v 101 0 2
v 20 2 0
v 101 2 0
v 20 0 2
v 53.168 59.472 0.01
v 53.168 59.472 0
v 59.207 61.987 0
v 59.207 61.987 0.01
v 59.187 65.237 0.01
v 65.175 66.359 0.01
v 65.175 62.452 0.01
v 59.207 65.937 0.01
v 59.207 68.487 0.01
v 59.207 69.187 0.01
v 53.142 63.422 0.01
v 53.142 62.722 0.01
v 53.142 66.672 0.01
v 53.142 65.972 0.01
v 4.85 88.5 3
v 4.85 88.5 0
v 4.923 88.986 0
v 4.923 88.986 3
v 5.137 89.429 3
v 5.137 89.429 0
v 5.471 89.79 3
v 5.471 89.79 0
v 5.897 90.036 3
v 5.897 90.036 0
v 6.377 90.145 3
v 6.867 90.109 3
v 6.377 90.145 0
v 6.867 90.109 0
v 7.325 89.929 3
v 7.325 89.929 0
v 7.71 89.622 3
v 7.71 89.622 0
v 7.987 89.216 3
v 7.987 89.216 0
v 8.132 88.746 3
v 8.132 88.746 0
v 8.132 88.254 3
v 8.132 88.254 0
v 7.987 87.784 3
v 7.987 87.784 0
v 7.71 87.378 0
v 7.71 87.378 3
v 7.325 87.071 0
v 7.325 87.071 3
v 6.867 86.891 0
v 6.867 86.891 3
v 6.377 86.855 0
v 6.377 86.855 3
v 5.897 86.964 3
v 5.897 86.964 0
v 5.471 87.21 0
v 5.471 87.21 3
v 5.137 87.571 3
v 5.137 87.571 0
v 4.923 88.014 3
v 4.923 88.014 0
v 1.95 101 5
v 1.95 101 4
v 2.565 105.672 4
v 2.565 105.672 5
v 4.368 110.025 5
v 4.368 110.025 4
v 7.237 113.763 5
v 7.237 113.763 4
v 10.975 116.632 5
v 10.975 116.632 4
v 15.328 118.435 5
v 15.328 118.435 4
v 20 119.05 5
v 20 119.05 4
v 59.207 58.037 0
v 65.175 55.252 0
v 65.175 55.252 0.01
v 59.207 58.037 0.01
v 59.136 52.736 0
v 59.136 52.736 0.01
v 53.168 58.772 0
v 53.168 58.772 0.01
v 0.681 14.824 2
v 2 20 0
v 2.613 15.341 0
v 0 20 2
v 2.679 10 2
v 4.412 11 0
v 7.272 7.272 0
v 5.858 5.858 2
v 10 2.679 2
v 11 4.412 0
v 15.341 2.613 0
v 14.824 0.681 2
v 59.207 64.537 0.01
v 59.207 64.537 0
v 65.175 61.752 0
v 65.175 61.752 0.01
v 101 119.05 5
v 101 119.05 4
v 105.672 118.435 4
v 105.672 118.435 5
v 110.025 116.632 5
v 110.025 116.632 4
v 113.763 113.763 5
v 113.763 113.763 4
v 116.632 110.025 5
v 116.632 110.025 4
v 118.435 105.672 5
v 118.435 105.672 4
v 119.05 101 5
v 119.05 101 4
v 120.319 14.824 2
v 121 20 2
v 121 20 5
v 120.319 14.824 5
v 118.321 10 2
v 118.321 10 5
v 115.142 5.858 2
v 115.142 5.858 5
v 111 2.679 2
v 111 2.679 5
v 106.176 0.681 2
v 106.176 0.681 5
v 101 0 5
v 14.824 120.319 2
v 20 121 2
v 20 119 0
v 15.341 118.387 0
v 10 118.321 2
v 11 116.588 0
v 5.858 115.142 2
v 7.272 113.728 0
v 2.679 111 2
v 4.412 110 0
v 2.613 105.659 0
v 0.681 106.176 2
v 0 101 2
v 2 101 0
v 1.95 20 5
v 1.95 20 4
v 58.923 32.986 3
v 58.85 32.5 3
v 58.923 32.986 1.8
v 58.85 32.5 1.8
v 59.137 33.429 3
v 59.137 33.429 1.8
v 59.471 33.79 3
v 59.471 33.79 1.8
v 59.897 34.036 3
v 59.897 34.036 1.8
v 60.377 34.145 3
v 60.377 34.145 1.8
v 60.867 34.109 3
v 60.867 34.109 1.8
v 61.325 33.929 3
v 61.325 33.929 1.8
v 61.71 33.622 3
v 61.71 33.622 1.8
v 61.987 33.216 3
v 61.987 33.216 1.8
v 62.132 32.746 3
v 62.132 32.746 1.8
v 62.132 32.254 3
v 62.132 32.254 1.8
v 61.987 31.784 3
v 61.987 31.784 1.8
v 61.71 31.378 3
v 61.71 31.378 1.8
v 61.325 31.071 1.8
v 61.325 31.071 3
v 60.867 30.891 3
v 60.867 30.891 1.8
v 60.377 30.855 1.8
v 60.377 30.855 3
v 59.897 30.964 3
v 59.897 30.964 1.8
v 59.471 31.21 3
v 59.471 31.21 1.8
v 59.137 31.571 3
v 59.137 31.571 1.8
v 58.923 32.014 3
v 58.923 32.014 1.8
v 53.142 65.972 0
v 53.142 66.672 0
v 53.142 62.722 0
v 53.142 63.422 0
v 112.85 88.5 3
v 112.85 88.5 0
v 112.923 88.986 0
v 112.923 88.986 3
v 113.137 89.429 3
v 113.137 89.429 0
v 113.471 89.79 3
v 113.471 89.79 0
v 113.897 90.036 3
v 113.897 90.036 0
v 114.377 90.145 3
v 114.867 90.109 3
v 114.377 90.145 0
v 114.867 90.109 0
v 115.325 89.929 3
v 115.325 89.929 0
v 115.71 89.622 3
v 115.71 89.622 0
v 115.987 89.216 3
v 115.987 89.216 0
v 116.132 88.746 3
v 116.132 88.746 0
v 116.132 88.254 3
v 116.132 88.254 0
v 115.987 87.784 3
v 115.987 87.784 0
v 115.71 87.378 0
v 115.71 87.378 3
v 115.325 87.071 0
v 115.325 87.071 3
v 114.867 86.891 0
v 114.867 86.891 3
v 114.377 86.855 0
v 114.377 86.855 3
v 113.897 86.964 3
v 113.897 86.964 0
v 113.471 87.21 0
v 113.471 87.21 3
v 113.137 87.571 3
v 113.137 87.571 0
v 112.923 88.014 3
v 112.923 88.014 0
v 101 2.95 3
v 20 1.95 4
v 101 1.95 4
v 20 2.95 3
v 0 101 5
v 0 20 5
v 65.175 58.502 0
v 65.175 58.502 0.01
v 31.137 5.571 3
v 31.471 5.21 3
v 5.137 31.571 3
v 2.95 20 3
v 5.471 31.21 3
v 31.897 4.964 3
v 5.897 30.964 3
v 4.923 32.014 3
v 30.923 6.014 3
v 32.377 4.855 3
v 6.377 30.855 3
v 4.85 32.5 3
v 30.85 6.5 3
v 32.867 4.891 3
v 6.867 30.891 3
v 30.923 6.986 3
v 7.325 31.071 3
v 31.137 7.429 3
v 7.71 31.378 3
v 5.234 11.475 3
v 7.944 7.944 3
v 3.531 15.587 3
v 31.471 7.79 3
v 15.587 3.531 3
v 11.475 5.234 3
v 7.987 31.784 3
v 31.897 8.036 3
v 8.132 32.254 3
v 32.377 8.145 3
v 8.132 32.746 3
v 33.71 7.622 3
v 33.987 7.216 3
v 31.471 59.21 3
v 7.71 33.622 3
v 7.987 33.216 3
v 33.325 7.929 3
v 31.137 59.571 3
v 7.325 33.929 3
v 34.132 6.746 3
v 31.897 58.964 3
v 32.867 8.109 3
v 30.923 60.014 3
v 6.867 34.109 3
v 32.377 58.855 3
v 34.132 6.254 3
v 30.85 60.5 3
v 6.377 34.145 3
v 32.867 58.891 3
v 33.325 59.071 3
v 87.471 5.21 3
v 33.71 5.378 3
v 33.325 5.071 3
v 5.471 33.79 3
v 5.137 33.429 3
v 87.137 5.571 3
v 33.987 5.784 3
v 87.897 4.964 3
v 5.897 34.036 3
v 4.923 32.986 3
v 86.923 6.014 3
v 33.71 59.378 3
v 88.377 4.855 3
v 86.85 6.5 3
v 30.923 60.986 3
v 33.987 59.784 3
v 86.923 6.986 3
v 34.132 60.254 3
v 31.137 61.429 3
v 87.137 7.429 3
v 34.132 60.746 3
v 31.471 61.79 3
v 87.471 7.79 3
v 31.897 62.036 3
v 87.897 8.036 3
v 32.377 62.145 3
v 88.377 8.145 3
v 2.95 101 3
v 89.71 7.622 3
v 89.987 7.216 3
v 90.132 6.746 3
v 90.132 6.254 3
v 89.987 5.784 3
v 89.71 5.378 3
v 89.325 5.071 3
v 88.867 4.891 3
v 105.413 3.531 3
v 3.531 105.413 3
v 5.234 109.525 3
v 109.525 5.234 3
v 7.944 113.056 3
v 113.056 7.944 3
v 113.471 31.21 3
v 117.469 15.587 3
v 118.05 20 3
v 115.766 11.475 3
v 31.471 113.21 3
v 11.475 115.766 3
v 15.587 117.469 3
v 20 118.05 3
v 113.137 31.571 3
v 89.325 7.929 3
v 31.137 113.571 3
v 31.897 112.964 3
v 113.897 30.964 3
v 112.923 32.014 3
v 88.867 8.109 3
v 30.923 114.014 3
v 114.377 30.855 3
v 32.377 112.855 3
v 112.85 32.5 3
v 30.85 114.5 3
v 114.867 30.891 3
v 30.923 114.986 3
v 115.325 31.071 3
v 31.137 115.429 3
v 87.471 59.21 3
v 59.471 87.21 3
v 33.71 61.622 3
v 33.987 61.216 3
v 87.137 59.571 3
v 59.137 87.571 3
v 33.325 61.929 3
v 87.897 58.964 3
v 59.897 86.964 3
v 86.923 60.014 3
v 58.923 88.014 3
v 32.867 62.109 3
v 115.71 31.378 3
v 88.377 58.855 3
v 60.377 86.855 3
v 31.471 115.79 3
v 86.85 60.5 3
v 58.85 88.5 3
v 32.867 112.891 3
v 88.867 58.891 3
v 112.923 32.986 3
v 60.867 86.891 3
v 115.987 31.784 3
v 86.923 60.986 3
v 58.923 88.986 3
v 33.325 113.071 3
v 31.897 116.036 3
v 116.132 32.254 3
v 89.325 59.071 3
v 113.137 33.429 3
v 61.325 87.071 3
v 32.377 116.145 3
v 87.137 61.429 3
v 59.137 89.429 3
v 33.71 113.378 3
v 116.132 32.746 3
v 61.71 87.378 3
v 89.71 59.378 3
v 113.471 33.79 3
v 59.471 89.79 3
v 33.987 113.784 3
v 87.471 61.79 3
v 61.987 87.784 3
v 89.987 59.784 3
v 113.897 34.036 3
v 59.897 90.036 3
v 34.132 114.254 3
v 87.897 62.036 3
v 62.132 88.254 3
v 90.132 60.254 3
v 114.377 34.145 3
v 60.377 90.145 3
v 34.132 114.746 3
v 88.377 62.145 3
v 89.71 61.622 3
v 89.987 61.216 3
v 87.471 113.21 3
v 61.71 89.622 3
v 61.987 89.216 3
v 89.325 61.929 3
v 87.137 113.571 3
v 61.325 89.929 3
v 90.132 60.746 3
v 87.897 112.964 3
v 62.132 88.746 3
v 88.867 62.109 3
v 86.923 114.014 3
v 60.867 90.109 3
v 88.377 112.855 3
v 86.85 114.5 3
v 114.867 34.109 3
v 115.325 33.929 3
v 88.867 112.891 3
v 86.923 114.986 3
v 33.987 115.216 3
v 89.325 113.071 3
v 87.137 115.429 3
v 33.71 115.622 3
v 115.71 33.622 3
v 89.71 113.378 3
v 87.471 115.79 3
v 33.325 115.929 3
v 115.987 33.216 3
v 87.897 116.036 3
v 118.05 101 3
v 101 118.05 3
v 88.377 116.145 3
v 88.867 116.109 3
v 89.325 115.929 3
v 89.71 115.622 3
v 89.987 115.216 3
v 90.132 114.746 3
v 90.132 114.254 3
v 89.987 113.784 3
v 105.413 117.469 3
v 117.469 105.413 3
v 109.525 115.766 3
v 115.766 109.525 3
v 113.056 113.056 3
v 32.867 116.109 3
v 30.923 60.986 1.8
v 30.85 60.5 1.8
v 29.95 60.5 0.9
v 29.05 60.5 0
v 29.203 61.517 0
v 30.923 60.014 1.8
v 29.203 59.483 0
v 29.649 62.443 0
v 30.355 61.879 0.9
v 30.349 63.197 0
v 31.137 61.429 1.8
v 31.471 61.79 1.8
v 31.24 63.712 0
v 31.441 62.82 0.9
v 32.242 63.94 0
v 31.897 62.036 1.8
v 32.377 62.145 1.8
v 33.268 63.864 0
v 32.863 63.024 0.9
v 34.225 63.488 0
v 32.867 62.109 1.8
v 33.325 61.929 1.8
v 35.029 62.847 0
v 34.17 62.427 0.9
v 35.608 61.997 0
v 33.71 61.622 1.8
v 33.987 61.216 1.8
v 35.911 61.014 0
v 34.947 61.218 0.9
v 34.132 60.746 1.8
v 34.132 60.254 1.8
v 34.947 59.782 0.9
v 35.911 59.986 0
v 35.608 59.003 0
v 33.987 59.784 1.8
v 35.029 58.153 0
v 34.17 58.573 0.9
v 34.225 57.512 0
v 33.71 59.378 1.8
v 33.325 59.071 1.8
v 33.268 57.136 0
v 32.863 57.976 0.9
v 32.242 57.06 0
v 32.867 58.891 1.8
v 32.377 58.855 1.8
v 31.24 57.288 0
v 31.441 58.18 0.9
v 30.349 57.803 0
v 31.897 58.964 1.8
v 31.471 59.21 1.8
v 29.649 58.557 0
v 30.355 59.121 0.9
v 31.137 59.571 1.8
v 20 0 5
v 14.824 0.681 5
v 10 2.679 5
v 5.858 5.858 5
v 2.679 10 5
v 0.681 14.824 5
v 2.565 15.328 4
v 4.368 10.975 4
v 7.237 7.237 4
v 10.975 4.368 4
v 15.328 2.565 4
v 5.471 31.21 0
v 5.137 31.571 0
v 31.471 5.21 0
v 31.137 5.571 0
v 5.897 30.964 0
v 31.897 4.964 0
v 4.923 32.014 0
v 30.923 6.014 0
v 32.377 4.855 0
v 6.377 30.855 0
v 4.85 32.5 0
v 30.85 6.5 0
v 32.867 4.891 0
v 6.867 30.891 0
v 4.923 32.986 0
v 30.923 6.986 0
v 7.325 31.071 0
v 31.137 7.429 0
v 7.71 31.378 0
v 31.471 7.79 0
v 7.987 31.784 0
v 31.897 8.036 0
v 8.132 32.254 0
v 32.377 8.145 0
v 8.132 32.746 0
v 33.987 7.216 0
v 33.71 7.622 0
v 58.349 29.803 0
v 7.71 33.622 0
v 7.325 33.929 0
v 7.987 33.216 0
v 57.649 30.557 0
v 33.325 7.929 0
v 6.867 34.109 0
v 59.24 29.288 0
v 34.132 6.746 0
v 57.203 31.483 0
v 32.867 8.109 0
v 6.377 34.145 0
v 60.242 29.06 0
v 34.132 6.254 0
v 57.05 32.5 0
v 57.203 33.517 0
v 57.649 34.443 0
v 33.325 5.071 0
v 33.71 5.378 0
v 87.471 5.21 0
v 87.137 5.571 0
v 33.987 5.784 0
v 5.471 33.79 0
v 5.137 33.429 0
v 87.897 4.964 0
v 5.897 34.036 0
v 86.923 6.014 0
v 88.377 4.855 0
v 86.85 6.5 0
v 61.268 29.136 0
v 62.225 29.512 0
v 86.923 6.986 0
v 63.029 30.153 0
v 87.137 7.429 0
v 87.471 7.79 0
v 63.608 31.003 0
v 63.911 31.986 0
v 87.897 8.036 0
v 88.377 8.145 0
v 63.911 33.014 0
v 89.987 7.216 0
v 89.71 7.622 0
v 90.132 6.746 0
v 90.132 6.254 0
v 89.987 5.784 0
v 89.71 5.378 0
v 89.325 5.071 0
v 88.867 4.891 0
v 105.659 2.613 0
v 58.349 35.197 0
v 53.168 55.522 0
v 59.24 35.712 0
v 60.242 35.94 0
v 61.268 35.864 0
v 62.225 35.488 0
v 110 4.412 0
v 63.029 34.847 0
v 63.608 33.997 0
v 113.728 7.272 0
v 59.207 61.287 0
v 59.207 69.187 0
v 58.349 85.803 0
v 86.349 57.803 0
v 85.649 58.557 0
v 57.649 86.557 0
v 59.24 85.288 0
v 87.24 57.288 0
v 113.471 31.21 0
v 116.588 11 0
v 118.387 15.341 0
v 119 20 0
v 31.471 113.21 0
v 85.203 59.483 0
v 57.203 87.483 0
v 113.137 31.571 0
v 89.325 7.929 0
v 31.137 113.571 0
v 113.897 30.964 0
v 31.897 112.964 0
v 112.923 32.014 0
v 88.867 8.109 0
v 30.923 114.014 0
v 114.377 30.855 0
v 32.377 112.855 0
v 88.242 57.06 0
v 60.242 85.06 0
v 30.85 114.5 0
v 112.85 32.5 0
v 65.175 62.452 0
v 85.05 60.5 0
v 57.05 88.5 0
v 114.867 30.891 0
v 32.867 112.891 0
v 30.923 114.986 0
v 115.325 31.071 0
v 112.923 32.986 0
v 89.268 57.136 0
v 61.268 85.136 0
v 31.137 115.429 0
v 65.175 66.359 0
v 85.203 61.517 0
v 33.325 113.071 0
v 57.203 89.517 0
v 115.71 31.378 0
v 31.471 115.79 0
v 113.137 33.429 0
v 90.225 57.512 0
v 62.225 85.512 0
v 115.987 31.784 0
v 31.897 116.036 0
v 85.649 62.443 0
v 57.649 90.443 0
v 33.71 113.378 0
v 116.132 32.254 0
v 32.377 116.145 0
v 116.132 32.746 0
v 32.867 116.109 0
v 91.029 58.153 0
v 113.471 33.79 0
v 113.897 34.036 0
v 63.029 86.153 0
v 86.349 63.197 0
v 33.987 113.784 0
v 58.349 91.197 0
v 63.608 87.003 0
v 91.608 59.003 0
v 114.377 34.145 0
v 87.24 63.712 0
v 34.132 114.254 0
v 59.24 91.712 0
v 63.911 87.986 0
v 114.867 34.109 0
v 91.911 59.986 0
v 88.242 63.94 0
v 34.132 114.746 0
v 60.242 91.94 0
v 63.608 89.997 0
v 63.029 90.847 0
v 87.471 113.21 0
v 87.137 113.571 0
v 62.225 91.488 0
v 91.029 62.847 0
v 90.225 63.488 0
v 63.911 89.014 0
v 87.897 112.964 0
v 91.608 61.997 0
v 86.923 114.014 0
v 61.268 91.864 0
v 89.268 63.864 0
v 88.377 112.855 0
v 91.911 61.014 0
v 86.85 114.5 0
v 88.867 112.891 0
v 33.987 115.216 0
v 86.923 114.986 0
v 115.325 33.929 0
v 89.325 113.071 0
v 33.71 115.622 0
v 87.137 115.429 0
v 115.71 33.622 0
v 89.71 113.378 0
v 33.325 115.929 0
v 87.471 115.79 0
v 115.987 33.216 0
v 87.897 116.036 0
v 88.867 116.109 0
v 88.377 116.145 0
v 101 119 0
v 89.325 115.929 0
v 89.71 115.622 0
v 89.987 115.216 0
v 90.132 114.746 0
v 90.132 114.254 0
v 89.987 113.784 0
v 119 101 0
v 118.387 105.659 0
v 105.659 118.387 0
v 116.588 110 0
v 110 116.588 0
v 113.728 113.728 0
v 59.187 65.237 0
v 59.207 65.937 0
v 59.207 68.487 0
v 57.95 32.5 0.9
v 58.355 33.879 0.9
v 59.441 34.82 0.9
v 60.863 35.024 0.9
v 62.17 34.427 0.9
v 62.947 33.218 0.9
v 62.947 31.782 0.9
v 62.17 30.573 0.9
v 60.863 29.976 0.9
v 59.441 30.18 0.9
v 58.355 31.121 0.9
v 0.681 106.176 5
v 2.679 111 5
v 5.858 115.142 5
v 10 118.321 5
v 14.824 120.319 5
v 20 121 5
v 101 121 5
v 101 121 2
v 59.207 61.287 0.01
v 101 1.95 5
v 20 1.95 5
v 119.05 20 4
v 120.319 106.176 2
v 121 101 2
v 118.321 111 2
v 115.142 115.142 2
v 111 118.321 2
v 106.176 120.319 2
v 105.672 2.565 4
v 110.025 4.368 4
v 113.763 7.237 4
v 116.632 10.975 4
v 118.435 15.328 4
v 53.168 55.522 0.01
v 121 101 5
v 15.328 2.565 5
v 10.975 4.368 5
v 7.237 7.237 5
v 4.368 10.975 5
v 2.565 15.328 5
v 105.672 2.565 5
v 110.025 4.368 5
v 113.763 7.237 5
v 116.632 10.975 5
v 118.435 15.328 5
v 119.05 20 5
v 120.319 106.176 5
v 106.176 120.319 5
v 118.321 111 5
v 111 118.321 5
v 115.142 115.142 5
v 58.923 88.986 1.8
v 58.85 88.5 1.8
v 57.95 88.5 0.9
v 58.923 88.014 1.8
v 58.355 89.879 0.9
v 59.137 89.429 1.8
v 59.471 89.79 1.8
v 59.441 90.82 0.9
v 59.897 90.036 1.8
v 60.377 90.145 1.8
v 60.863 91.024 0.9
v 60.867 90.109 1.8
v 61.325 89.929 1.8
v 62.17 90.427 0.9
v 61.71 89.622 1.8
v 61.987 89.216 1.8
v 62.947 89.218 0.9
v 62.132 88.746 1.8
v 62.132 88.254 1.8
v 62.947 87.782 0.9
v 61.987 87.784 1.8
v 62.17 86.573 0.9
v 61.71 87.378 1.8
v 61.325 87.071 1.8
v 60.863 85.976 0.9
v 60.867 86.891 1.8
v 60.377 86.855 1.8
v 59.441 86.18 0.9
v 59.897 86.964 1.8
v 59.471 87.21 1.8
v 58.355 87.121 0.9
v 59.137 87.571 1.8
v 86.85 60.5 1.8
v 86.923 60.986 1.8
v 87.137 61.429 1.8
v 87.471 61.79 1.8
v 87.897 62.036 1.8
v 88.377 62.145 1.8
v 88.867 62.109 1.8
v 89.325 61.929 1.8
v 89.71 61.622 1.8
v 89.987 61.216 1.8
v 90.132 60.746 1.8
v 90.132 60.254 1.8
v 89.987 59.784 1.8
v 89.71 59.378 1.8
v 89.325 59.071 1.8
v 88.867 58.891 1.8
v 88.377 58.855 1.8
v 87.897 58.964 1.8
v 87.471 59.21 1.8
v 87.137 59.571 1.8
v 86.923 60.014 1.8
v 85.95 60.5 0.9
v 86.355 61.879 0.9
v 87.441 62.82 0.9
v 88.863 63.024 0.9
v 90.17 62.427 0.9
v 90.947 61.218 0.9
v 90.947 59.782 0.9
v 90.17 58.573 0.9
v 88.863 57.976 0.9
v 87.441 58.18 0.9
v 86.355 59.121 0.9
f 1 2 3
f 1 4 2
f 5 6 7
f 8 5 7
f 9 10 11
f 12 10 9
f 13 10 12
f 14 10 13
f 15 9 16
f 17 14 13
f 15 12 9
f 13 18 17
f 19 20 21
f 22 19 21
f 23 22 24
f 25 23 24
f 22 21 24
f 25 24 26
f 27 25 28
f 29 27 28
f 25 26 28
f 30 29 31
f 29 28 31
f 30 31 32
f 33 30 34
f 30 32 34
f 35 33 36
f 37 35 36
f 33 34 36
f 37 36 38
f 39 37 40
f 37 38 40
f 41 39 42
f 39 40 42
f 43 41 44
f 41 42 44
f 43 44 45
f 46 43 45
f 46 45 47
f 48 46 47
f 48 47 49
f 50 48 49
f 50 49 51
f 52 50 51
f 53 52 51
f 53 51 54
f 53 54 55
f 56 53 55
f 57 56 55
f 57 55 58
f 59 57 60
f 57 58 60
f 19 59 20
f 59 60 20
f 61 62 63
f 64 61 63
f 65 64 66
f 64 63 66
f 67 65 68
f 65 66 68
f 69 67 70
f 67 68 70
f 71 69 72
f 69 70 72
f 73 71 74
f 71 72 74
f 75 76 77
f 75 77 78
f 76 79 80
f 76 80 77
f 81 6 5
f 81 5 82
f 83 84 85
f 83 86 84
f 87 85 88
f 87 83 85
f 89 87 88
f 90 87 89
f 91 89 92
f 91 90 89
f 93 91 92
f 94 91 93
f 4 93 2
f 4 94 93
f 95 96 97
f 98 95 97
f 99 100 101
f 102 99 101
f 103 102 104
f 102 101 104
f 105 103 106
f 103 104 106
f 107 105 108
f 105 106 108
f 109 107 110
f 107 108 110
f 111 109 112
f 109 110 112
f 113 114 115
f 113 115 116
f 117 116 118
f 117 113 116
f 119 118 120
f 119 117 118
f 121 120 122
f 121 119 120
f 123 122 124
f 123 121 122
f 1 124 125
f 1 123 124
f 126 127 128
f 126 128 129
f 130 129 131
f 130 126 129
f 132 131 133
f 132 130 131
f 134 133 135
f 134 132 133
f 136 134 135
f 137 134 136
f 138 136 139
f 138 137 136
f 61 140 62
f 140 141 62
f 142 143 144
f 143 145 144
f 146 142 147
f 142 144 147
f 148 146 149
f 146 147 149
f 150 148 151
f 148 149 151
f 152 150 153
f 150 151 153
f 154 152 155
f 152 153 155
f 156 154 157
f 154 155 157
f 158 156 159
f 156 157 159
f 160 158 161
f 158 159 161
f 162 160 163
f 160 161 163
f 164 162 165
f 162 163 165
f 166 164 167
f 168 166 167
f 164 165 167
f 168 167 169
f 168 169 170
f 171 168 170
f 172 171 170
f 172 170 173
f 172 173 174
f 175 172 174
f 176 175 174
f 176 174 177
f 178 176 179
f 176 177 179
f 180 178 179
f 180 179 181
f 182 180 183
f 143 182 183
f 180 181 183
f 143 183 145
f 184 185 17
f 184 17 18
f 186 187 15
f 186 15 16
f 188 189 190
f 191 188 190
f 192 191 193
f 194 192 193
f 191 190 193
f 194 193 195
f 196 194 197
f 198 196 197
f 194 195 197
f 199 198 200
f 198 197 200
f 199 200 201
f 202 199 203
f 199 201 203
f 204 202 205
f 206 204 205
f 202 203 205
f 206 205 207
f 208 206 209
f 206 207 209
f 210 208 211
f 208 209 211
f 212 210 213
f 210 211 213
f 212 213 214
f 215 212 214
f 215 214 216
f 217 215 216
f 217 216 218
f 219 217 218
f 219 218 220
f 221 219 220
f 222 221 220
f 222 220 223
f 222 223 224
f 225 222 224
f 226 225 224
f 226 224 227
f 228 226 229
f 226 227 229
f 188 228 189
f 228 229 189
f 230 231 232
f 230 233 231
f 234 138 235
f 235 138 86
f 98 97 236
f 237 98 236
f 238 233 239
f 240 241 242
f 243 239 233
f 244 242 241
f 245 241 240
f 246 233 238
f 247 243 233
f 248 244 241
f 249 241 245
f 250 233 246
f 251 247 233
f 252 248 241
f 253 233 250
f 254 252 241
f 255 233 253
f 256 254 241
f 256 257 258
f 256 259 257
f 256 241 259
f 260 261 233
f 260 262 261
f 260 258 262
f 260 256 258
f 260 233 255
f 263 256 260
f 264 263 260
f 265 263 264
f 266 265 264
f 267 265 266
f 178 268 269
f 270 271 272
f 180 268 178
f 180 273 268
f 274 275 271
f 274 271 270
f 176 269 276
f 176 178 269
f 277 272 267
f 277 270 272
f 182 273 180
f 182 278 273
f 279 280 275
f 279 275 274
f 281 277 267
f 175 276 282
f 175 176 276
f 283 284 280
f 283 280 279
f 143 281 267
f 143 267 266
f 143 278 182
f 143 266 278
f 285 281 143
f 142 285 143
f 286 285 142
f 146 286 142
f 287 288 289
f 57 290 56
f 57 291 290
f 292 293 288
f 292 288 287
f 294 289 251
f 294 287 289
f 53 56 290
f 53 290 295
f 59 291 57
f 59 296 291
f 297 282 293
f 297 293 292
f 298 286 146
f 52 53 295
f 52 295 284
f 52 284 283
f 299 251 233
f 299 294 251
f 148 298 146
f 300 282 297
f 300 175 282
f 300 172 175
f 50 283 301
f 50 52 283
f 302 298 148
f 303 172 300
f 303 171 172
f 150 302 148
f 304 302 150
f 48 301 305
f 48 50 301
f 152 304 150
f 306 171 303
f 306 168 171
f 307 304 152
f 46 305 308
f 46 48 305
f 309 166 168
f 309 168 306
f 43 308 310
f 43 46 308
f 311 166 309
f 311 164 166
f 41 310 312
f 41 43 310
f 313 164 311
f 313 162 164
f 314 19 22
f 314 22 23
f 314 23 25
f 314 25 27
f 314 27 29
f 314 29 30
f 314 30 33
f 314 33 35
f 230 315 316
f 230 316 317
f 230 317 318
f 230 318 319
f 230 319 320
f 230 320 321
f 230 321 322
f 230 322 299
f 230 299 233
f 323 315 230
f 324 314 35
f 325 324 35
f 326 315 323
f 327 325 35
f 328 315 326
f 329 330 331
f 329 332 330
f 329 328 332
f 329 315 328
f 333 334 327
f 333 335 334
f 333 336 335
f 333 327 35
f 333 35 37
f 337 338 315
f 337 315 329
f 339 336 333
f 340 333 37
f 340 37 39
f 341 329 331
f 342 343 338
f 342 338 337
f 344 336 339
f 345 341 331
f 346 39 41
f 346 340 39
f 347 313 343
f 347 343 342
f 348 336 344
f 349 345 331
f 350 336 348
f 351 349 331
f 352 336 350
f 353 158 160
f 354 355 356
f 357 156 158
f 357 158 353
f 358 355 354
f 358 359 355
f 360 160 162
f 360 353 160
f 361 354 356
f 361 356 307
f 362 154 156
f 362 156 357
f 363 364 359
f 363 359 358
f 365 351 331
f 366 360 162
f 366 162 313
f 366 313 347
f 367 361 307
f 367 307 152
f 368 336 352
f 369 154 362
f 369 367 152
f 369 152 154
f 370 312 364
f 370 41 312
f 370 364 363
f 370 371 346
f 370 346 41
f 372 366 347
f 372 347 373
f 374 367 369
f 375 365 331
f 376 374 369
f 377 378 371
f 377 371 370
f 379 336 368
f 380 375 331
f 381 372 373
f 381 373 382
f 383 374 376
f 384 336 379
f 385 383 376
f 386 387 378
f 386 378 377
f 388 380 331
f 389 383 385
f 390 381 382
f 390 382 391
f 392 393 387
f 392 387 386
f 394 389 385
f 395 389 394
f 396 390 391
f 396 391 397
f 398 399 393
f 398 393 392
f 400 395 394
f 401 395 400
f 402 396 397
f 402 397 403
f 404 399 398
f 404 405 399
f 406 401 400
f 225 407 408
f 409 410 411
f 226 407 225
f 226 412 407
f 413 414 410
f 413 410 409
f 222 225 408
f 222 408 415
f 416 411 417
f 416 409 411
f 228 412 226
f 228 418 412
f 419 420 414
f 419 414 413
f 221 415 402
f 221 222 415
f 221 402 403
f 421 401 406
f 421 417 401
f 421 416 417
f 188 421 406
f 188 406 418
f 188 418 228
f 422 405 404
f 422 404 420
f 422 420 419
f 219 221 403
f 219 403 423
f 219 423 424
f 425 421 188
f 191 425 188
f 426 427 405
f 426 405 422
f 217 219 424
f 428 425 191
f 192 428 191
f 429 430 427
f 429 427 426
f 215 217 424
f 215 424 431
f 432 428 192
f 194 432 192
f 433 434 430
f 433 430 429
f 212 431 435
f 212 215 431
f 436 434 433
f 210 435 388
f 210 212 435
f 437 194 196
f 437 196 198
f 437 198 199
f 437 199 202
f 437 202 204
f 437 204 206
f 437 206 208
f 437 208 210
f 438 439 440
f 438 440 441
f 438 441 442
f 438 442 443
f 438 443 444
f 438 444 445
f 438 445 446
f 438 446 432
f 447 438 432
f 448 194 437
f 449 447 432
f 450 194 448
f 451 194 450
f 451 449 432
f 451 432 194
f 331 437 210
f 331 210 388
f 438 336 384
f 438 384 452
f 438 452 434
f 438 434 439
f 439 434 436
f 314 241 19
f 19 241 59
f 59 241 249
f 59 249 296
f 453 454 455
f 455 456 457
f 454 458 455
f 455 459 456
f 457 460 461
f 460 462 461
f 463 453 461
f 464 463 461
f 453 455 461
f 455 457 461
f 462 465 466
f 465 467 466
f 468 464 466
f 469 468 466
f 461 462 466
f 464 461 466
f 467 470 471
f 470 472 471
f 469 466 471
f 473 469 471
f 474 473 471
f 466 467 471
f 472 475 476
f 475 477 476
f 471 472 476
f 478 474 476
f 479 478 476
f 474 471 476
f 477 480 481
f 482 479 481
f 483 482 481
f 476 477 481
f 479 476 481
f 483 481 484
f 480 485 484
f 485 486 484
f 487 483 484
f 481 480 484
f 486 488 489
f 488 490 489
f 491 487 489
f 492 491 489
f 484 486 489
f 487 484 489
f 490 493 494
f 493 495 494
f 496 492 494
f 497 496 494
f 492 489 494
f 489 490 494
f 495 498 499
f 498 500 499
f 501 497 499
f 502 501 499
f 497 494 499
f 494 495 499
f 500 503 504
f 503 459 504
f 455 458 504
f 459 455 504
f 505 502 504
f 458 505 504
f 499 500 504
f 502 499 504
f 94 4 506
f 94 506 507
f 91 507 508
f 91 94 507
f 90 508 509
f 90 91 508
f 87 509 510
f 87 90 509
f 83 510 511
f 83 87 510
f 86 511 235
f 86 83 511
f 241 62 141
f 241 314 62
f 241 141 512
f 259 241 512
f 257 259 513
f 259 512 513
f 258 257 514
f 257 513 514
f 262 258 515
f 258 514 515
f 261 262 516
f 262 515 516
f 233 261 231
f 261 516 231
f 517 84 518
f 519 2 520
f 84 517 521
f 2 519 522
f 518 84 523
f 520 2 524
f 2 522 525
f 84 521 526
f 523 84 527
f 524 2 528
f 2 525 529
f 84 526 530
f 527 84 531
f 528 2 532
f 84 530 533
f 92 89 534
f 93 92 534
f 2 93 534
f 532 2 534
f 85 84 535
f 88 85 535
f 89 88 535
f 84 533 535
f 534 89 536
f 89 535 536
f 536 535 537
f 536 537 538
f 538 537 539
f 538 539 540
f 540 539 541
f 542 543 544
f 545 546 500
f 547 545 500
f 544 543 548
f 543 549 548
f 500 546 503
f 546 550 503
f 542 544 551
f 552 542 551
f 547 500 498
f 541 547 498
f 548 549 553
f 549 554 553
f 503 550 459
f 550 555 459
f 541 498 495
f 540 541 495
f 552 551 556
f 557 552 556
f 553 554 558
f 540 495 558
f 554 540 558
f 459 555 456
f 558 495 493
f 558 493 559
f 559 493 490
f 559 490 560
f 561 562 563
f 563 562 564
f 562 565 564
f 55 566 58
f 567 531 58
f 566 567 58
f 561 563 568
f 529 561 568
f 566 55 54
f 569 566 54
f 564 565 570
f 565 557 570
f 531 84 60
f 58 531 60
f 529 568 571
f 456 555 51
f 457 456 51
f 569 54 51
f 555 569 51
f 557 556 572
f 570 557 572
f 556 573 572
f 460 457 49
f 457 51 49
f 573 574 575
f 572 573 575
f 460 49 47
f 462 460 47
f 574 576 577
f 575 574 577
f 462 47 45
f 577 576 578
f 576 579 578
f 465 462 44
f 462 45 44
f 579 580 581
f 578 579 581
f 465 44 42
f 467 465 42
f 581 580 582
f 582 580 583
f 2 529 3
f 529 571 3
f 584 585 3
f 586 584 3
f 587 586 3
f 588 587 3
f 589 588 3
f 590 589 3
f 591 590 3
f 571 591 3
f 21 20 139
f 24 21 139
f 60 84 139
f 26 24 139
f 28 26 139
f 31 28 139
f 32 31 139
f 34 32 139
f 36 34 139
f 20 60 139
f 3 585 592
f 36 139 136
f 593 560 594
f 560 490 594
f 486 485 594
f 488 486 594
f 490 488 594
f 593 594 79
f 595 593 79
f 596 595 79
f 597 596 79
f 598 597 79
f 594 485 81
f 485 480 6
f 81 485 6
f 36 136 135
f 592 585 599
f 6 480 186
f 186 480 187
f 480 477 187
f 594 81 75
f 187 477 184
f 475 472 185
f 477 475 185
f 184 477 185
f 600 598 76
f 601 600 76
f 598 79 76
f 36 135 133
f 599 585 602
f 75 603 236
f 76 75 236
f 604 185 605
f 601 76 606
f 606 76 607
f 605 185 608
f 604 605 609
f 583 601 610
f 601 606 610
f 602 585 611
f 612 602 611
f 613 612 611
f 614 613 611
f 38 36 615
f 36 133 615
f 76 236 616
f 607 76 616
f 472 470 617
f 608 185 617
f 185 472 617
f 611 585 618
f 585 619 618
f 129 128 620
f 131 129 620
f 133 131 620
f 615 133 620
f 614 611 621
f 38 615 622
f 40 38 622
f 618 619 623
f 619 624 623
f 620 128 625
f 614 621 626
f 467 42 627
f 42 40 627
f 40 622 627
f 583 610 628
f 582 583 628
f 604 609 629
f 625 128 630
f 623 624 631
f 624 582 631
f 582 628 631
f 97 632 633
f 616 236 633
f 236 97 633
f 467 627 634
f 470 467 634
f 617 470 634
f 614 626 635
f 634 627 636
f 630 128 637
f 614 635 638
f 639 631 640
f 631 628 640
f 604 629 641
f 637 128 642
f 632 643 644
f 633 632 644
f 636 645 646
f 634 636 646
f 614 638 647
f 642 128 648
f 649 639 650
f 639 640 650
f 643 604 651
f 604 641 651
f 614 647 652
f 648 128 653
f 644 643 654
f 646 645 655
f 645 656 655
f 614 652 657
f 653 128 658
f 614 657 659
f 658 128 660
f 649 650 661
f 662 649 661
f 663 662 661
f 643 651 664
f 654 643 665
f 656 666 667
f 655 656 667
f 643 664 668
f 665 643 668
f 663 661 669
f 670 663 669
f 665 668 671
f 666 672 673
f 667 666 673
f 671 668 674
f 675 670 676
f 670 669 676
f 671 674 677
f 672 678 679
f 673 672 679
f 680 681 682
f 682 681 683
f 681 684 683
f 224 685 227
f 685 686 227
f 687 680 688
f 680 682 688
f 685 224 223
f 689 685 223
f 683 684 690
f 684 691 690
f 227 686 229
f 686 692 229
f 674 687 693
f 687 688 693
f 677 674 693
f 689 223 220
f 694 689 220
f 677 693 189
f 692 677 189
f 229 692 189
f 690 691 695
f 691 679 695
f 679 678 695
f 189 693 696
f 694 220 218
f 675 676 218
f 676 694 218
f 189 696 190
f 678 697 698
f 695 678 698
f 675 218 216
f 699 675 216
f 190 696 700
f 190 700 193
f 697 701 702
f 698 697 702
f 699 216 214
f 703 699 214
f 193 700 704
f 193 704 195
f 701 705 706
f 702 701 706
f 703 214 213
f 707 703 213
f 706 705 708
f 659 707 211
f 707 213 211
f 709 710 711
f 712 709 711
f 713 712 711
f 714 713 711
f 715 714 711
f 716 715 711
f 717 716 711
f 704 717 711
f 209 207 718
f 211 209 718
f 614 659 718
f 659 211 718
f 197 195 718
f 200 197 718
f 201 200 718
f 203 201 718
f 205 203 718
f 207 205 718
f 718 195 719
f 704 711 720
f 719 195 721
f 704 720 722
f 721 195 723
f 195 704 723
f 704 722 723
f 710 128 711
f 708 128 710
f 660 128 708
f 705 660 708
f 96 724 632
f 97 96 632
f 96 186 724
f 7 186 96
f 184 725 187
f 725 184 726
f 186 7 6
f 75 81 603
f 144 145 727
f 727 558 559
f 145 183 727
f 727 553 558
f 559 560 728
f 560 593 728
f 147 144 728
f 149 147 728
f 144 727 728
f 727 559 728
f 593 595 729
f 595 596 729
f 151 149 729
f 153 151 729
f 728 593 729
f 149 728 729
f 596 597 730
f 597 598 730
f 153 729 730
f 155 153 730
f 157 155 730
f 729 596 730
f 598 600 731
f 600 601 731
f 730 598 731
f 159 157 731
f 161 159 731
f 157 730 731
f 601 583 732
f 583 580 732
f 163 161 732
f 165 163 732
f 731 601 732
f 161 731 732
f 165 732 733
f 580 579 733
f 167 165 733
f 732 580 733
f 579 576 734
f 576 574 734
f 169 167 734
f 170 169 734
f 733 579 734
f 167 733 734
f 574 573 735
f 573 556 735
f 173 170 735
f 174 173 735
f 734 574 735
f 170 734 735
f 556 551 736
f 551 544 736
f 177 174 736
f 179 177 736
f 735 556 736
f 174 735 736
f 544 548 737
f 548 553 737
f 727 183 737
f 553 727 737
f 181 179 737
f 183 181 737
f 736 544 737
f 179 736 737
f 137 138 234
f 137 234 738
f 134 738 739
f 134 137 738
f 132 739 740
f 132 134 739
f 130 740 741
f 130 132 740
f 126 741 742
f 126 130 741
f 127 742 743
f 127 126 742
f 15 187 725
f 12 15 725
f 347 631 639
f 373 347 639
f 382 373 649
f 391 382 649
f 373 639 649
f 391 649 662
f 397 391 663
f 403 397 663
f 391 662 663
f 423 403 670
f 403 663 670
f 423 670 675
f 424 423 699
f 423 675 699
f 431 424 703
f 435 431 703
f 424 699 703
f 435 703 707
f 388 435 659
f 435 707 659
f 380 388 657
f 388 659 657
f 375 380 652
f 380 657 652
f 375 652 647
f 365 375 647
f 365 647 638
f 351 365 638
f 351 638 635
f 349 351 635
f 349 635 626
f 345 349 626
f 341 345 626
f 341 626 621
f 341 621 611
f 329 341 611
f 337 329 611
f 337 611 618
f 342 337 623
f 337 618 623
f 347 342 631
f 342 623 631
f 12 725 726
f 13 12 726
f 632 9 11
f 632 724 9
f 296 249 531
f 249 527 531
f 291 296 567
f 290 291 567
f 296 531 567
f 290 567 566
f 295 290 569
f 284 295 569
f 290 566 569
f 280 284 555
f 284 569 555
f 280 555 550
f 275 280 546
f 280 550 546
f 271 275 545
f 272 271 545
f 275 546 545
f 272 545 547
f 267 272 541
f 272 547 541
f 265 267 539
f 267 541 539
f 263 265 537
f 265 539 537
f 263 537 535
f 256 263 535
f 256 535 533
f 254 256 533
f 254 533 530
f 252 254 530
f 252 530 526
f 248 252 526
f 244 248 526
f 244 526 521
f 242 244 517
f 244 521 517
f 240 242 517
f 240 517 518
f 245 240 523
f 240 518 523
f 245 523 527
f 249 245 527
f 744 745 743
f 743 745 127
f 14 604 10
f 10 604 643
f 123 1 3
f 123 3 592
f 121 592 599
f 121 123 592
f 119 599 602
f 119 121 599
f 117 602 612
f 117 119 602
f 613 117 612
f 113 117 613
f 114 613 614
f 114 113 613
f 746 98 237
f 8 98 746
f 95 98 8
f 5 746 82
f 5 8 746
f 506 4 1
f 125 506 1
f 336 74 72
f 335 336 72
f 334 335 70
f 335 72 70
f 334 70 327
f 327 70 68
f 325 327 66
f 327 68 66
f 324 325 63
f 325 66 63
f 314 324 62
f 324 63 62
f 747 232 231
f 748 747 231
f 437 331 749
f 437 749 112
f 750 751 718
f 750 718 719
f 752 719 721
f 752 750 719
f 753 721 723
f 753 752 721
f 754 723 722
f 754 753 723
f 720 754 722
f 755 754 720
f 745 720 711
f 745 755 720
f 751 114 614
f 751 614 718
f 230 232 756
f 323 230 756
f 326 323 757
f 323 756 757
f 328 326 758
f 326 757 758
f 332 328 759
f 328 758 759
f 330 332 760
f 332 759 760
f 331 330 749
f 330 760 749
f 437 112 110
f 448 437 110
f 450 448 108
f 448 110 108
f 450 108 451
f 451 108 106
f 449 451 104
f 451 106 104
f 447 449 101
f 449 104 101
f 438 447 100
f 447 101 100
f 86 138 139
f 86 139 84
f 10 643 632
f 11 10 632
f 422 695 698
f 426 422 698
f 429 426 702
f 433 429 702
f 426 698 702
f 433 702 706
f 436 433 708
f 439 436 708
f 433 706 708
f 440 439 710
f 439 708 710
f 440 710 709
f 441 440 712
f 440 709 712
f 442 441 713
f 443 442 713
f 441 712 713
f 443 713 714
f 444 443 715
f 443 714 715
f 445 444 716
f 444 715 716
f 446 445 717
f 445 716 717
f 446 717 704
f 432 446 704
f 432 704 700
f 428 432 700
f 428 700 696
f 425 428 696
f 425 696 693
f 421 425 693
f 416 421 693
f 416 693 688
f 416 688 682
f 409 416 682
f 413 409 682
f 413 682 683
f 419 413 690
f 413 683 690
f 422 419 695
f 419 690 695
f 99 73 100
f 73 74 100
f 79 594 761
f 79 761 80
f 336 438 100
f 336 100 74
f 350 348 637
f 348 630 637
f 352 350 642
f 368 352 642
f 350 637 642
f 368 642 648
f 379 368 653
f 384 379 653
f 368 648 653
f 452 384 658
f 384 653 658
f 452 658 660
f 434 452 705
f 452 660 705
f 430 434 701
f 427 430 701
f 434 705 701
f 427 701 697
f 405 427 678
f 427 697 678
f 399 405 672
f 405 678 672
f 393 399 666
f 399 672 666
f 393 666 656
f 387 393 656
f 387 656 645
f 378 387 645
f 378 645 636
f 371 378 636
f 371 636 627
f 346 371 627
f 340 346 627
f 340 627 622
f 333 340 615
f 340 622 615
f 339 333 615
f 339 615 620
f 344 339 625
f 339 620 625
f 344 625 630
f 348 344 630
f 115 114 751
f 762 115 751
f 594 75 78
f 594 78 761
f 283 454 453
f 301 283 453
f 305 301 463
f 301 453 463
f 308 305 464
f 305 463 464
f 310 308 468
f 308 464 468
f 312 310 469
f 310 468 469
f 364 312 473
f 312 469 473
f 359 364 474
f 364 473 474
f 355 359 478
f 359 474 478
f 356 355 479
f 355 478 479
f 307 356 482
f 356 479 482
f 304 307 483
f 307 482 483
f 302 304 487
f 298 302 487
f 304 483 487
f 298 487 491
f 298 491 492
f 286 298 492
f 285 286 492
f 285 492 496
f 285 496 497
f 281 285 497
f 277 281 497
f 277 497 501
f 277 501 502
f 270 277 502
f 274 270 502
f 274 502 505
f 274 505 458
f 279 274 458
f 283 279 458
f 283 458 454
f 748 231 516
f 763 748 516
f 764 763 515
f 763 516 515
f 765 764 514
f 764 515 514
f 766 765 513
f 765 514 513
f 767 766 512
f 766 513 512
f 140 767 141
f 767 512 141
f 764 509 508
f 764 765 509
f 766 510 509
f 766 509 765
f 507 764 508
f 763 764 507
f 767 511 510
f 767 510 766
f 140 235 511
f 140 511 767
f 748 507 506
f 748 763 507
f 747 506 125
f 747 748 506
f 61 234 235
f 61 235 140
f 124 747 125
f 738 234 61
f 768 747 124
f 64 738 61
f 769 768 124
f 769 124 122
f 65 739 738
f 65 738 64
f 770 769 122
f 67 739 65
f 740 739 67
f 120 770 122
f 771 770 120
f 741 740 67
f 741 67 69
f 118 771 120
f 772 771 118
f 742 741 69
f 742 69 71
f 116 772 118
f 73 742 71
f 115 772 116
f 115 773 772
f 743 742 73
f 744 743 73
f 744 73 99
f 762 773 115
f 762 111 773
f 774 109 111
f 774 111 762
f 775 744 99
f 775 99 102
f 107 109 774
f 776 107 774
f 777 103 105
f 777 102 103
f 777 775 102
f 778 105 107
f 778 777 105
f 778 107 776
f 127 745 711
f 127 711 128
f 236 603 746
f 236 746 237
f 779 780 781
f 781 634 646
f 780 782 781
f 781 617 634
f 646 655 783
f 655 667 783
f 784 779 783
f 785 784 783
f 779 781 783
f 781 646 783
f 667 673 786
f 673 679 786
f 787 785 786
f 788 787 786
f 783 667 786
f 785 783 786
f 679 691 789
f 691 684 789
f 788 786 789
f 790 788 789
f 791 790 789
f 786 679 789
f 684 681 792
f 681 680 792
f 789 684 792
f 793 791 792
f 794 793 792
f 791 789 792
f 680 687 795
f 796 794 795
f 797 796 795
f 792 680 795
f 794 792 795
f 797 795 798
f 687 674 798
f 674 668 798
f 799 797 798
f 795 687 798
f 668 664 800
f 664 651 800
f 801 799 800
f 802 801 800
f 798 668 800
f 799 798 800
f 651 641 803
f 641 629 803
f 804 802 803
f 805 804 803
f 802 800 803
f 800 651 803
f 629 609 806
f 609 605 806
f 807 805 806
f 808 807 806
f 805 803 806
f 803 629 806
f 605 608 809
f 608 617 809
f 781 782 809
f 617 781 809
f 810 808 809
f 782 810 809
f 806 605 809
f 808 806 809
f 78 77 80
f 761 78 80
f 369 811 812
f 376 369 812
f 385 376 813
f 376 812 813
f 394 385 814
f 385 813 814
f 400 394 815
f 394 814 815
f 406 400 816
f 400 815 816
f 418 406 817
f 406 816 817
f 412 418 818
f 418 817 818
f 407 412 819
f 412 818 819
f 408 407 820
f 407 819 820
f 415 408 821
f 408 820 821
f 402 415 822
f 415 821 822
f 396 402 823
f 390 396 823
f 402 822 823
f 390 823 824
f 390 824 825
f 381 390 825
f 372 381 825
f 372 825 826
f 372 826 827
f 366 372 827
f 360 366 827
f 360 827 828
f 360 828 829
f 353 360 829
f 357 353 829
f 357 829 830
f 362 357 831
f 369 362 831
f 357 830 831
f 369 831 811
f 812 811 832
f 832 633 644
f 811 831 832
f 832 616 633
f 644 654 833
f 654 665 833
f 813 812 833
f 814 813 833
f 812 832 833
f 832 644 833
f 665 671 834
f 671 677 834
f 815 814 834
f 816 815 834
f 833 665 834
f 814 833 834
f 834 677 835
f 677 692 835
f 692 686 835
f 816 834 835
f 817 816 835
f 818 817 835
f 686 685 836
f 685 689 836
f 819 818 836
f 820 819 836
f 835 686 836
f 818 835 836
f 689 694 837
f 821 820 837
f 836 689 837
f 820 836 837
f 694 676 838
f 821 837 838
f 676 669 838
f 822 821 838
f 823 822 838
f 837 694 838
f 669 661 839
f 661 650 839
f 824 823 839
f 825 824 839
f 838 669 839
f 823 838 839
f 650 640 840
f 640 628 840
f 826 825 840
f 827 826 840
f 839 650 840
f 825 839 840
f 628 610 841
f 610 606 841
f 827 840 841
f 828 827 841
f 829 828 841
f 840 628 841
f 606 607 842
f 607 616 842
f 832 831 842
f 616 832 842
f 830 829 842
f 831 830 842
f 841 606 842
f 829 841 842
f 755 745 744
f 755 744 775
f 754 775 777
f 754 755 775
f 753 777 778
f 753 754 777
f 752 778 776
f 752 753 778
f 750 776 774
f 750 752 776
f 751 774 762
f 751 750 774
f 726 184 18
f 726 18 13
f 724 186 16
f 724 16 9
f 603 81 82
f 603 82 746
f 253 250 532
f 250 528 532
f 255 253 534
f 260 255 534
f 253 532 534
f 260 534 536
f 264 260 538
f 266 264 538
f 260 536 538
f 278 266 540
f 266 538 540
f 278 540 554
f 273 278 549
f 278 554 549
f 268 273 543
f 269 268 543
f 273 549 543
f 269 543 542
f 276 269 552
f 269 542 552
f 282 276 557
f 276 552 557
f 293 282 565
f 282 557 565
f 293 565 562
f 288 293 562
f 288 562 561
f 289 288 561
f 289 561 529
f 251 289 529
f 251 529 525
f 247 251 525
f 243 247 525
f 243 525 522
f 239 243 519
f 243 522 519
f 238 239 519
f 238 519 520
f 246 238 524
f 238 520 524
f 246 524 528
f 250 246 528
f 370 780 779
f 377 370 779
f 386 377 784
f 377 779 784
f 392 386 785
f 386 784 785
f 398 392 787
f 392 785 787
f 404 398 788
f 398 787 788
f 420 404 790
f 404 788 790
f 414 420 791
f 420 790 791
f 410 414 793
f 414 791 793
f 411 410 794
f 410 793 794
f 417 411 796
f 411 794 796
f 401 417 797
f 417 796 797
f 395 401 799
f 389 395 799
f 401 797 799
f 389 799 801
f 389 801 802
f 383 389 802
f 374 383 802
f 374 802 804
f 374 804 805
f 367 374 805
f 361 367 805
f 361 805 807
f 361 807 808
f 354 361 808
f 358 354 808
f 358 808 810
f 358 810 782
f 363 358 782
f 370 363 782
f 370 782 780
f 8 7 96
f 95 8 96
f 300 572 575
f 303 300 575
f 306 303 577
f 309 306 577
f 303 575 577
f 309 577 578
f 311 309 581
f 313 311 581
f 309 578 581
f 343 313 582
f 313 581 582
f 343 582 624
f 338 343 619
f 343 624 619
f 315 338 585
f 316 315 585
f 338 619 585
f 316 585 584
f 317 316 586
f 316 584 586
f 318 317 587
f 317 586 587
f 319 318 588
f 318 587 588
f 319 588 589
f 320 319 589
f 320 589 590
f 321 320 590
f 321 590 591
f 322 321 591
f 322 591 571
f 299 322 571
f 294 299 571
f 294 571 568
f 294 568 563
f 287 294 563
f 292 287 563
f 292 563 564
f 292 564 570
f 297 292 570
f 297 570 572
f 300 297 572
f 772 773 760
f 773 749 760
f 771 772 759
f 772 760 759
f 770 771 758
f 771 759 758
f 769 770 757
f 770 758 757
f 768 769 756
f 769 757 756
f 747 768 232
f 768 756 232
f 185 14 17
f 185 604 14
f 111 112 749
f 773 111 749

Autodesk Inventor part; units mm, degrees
ref_plane "YZ Plane" through (0, 0, 0) normal (1, 0, 0) x (0, 1, 0)
ref_plane "XZ Plane" through (0, 0, 0) normal (0, 1, 0) x (-1, 0, 0)
ref_plane "XY Plane" through (0, 0, 0) normal (0, 0, 1) x (1, 0, 0)
sketch "Sketch1" plane through (0, 0, 0) normal (0, 0, 1) x (1, 0, 0)
  line L0 (20, 0) -> (101, 0)
  line L1 (121, 20) -> (121, 101)
  line L2 (101, 121) -> (20, 121)
  line L3 (0, 101) -> (0, 20)
  arc A0 (20, 121) -> (0, 101) centre (20, 101) ccw
  arc A1 (121, 101) -> (101, 121) centre (101, 101) ccw
  arc A2 (101, 0) -> (121, 20) centre (101, 20) ccw
  arc A3 (0, 20) -> (20, 0) centre (20, 20) ccw
  point P0 (0, 0)
  point P1 (121, 121)
  point P2 (121, 0)
  point P3 (0, 121)
  dimension "d0" = 121
  dimension "d1" = 121
  dimension "d2" = 20
extrude "Extrusion1" add sketch "Sketch1" along normal blind 3
sketch "Sketch2" plane through (0, 0, 3) normal (0, 0, 1) x (1, 0, 0)
  arc A0 (101, 0) -> (121, 20) centre (101, 20) ccw projected
  line L0 (121, 20) -> (121, 101) projected
  arc A1 (121, 101) -> (101, 121) centre (101, 101) ccw projected
  line L1 (101, 121) -> (20, 121) projected
  arc A2 (20, 121) -> (0, 101) centre (20, 101) ccw projected
  line L2 (0, 101) -> (0, 20) projected
  arc A3 (0, 20) -> (20, 0) centre (20, 20) ccw projected
  line L3 (20, 0) -> (101, 0) projected
  line L4 (20, 119.05) -> (101, 119.05)
  arc A4 (119.05, 101) -> (101, 119.05) centre (101, 101) ccw
  line L5 (119.05, 101) -> (119.05, 20)
  arc A5 (101, 1.95) -> (119.05, 20) centre (101, 20) ccw
  line L6 (101, 1.95) -> (20, 1.95)
  arc A6 (1.95, 20) -> (20, 1.95) centre (20, 20) ccw
  line L7 (1.95, 20) -> (1.95, 101)
  arc A7 (20, 119.05) -> (1.95, 101) centre (20, 101) ccw
  point P0 (0, 0)
  dimension "d5" = 1.95
extrude "Extrusion2" add sketch "Sketch2" along normal blind 2
chamfer "Chamfer1" distance 1 angle 45 8 edges at (1.95, 60.5, 3) (7.2367, 7.2367, 3) (60.5, 1.95, 3) (113.7633, 7.2367, 3) (119.05, 60.5, 3) (113.7633, 113.7633, 3) (60.5, 119.05, 3) (7.2367, 113.7633, 3)
sketch "Sketch3" plane through (0, 0, 0) normal (0, 0, -1) x (-1, 0, 0)
  circle A0 centre (-6.5, 88.5) radius 2.15 projected
  circle A1 centre (-6.5, 32.5) radius 2.15 projected
  circle A2 centre (-32.5, 6.5) radius 2.15 projected
  circle A3 centre (-88.5, 6.5) radius 2.15 projected
  circle A4 centre (-114.5, 32.5) radius 2.15 projected
  circle A5 centre (-114.5, 88.5) radius 2.15 projected
  circle A6 centre (-88.5, 114.5) radius 2.15 projected
  circle A7 centre (-32.5, 114.5) radius 2.15 projected
  circle A8 centre (-60.5, 60.5) radius 2.15 projected
  circle A9 centre (-60.5, 88.5) radius 2.15 projected
  circle A10 centre (-88.5, 60.5) radius 2.15 projected
  circle A11 centre (-60.5, 32.5) radius 2.15 projected
  circle A12 centre (-32.5, 60.5) radius 2.15 projected
  circle A13 centre (-88.5, 114.5) radius 1.65
  circle A14 centre (-32.5, 114.5) radius 1.65
  circle A15 centre (-60.5, 88.5) radius 1.65
  circle A16 centre (-114.5, 88.5) radius 1.65
  circle A17 centre (-88.5, 60.5) radius 1.65
  circle A18 centre (-60.5, 60.5) radius 1.65
  circle A19 centre (-32.5, 60.5) radius 1.65
  circle A20 centre (-6.5, 88.5) radius 1.65
  circle A21 centre (-6.5, 32.5) radius 1.65
  circle A22 centre (-60.5, 32.5) radius 1.65
  circle A23 centre (-114.5, 32.5) radius 1.65
  circle A24 centre (-88.5, 6.5) radius 1.65
  circle A25 centre (-32.5, 6.5) radius 1.65
  point P0 (0, 0)
  dimension "d11" = 3.3
  dimension "d12" = 3.3
  dimension "d13" = 3.3
  dimension "d14" = 3.3
  dimension "d15" = 3.3
  dimension "d16" = 3.3
  dimension "d17" = 3.3
  dimension "d18" = 3.3
  dimension "d19" = 3.3
  dimension "d20" = 3.3
  dimension "d21" = 3.3
  dimension "d22" = 3.3
  dimension "d23" = 3.3
extrude "Extrusion3" cut sketch "Sketch3" against normal through all contours A13 | A14 | A15 | A16 | A17 | A19 | A20 | A21 | A22 | A23 | A24 | A25
chamfer "Chamfer2" distance 1.8 angle 45 4 edges at (62.15, 88.5, 0) (90.15, 60.5, 0) (34.15, 60.5, 0) (62.15, 32.5, 0)
chamfer "Chamfer3" distance 2 angle 45 8 edges at (60.5, 121, 0) (5.8579, 115.1421, 0) (0, 60.5, 0) (5.8579, 5.8579, 0) (60.5, 0, 0) (115.1421, 5.8579, 0) (121, 60.5, 0) (115.1421, 115.1421, 0)
sketch "Sketch4" plane through (0, 0, 0) normal (0, 0, -1) x (-1, 0, 0)
  line L0 (-53.168, 55.5218) -> (-59.1357, 52.7365)
  line L1 (-59.1357, 52.7365) -> (-65.1751, 55.2519)
  line L2 (-65.1751, 55.2519) -> (-59.2074, 58.0372)
  line L3 (-59.2074, 58.0372) -> (-53.168, 55.5218)
  line L4 (-53.168, 59.4718) -> (-59.2074, 61.9872)
  line L5 (-59.2074, 61.9872) -> (-59.2074, 64.5372)
  line L6 (-59.2074, 64.5372) -> (-65.1751, 61.7519)
  line L7 (-65.1751, 61.7519) -> (-65.1751, 58.5019)
  line L8 (-53.168, 59.4718) -> (-53.168, 58.7718)
  line L9 (-53.168, 58.7718) -> (-59.2074, 61.2872)
  line L10 (-59.2074, 61.2872) -> (-65.1751, 58.5019)
  line L11 (-59.2074, 69.1872) -> (-65.1751, 66.359)
  line L12 (-59.2074, 65.9372) -> (-59.2074, 68.4872)
  line L13 (-53.1419, 63.4218) -> (-59.2074, 65.9372)
  line L14 (-53.1419, 63.4218) -> (-53.1419, 62.7218)
  line L15 (-53.1419, 62.7218) -> (-59.1873, 65.2372)
  line L16 (-65.1751, 66.359) -> (-65.1751, 62.4519)
  line L17 (-59.1873, 65.2372) -> (-65.1751, 62.4519)
  line L18 (-59.2074, 69.1872) -> (-53.1419, 66.6718)
  line L19 (-53.1419, 66.6718) -> (-53.1419, 65.9718)
  line L20 (-53.1419, 65.9718) -> (-59.2074, 68.4872)
  point P0 (0, 0)
  dimension "d32" = 0.7
  dimension "d33" = 0.7
  dimension "d34" = 0.7
  dimension "d35" = 0.7
  dimension "d36" = 0
  dimension "d37" = 3.25
  dimension "d38" = 0.7
  dimension "d39" = 0.7
  dimension "d40" = 0.7
  dimension "d41" = 0.7
  dimension "d42" = 3.25
  dimension "d43" = 3.25
  dimension "d44" = 3.25
  dimension "d45" = 3.25
  dimension "d46" = 3.25
  dimension "d47" = 3.25
extrude "Extrusion4" cut sketch "Sketch4" against normal blind 0.01
equation "\"d1\" = d0"
equation "\"d12\" = d11"
equation "\"d13\" = d11"
equation "\"d14\" = d11"
equation "\"d15\" = d11"
equation "\"d16\" = d11"
equation "\"d17\" = d11"
equation "\"d18\" = d11"
equation "\"d19\" = d11"
equation "\"d20\" = d11"
equation "\"d21\" = d20"
equation "\"d22\" = d20"
equation "\"d23\" = d20"
equation "\"d33\" = d32"
equation "\"d34\" = d32"
equation "\"d38\" = d32"
equation "\"d39\" = d32"
equation "\"d40\" = d32"
equation "\"d41\" = d32"
equation "\"d42\" = d37"
equation "\"d44\" = d42"
equation "\"d45\" = d44"
equation "\"d46\" = d45"
equation "\"d47\" = d45"
properties part number "battery_pack_cover_rear" material "ABS Plastic"
